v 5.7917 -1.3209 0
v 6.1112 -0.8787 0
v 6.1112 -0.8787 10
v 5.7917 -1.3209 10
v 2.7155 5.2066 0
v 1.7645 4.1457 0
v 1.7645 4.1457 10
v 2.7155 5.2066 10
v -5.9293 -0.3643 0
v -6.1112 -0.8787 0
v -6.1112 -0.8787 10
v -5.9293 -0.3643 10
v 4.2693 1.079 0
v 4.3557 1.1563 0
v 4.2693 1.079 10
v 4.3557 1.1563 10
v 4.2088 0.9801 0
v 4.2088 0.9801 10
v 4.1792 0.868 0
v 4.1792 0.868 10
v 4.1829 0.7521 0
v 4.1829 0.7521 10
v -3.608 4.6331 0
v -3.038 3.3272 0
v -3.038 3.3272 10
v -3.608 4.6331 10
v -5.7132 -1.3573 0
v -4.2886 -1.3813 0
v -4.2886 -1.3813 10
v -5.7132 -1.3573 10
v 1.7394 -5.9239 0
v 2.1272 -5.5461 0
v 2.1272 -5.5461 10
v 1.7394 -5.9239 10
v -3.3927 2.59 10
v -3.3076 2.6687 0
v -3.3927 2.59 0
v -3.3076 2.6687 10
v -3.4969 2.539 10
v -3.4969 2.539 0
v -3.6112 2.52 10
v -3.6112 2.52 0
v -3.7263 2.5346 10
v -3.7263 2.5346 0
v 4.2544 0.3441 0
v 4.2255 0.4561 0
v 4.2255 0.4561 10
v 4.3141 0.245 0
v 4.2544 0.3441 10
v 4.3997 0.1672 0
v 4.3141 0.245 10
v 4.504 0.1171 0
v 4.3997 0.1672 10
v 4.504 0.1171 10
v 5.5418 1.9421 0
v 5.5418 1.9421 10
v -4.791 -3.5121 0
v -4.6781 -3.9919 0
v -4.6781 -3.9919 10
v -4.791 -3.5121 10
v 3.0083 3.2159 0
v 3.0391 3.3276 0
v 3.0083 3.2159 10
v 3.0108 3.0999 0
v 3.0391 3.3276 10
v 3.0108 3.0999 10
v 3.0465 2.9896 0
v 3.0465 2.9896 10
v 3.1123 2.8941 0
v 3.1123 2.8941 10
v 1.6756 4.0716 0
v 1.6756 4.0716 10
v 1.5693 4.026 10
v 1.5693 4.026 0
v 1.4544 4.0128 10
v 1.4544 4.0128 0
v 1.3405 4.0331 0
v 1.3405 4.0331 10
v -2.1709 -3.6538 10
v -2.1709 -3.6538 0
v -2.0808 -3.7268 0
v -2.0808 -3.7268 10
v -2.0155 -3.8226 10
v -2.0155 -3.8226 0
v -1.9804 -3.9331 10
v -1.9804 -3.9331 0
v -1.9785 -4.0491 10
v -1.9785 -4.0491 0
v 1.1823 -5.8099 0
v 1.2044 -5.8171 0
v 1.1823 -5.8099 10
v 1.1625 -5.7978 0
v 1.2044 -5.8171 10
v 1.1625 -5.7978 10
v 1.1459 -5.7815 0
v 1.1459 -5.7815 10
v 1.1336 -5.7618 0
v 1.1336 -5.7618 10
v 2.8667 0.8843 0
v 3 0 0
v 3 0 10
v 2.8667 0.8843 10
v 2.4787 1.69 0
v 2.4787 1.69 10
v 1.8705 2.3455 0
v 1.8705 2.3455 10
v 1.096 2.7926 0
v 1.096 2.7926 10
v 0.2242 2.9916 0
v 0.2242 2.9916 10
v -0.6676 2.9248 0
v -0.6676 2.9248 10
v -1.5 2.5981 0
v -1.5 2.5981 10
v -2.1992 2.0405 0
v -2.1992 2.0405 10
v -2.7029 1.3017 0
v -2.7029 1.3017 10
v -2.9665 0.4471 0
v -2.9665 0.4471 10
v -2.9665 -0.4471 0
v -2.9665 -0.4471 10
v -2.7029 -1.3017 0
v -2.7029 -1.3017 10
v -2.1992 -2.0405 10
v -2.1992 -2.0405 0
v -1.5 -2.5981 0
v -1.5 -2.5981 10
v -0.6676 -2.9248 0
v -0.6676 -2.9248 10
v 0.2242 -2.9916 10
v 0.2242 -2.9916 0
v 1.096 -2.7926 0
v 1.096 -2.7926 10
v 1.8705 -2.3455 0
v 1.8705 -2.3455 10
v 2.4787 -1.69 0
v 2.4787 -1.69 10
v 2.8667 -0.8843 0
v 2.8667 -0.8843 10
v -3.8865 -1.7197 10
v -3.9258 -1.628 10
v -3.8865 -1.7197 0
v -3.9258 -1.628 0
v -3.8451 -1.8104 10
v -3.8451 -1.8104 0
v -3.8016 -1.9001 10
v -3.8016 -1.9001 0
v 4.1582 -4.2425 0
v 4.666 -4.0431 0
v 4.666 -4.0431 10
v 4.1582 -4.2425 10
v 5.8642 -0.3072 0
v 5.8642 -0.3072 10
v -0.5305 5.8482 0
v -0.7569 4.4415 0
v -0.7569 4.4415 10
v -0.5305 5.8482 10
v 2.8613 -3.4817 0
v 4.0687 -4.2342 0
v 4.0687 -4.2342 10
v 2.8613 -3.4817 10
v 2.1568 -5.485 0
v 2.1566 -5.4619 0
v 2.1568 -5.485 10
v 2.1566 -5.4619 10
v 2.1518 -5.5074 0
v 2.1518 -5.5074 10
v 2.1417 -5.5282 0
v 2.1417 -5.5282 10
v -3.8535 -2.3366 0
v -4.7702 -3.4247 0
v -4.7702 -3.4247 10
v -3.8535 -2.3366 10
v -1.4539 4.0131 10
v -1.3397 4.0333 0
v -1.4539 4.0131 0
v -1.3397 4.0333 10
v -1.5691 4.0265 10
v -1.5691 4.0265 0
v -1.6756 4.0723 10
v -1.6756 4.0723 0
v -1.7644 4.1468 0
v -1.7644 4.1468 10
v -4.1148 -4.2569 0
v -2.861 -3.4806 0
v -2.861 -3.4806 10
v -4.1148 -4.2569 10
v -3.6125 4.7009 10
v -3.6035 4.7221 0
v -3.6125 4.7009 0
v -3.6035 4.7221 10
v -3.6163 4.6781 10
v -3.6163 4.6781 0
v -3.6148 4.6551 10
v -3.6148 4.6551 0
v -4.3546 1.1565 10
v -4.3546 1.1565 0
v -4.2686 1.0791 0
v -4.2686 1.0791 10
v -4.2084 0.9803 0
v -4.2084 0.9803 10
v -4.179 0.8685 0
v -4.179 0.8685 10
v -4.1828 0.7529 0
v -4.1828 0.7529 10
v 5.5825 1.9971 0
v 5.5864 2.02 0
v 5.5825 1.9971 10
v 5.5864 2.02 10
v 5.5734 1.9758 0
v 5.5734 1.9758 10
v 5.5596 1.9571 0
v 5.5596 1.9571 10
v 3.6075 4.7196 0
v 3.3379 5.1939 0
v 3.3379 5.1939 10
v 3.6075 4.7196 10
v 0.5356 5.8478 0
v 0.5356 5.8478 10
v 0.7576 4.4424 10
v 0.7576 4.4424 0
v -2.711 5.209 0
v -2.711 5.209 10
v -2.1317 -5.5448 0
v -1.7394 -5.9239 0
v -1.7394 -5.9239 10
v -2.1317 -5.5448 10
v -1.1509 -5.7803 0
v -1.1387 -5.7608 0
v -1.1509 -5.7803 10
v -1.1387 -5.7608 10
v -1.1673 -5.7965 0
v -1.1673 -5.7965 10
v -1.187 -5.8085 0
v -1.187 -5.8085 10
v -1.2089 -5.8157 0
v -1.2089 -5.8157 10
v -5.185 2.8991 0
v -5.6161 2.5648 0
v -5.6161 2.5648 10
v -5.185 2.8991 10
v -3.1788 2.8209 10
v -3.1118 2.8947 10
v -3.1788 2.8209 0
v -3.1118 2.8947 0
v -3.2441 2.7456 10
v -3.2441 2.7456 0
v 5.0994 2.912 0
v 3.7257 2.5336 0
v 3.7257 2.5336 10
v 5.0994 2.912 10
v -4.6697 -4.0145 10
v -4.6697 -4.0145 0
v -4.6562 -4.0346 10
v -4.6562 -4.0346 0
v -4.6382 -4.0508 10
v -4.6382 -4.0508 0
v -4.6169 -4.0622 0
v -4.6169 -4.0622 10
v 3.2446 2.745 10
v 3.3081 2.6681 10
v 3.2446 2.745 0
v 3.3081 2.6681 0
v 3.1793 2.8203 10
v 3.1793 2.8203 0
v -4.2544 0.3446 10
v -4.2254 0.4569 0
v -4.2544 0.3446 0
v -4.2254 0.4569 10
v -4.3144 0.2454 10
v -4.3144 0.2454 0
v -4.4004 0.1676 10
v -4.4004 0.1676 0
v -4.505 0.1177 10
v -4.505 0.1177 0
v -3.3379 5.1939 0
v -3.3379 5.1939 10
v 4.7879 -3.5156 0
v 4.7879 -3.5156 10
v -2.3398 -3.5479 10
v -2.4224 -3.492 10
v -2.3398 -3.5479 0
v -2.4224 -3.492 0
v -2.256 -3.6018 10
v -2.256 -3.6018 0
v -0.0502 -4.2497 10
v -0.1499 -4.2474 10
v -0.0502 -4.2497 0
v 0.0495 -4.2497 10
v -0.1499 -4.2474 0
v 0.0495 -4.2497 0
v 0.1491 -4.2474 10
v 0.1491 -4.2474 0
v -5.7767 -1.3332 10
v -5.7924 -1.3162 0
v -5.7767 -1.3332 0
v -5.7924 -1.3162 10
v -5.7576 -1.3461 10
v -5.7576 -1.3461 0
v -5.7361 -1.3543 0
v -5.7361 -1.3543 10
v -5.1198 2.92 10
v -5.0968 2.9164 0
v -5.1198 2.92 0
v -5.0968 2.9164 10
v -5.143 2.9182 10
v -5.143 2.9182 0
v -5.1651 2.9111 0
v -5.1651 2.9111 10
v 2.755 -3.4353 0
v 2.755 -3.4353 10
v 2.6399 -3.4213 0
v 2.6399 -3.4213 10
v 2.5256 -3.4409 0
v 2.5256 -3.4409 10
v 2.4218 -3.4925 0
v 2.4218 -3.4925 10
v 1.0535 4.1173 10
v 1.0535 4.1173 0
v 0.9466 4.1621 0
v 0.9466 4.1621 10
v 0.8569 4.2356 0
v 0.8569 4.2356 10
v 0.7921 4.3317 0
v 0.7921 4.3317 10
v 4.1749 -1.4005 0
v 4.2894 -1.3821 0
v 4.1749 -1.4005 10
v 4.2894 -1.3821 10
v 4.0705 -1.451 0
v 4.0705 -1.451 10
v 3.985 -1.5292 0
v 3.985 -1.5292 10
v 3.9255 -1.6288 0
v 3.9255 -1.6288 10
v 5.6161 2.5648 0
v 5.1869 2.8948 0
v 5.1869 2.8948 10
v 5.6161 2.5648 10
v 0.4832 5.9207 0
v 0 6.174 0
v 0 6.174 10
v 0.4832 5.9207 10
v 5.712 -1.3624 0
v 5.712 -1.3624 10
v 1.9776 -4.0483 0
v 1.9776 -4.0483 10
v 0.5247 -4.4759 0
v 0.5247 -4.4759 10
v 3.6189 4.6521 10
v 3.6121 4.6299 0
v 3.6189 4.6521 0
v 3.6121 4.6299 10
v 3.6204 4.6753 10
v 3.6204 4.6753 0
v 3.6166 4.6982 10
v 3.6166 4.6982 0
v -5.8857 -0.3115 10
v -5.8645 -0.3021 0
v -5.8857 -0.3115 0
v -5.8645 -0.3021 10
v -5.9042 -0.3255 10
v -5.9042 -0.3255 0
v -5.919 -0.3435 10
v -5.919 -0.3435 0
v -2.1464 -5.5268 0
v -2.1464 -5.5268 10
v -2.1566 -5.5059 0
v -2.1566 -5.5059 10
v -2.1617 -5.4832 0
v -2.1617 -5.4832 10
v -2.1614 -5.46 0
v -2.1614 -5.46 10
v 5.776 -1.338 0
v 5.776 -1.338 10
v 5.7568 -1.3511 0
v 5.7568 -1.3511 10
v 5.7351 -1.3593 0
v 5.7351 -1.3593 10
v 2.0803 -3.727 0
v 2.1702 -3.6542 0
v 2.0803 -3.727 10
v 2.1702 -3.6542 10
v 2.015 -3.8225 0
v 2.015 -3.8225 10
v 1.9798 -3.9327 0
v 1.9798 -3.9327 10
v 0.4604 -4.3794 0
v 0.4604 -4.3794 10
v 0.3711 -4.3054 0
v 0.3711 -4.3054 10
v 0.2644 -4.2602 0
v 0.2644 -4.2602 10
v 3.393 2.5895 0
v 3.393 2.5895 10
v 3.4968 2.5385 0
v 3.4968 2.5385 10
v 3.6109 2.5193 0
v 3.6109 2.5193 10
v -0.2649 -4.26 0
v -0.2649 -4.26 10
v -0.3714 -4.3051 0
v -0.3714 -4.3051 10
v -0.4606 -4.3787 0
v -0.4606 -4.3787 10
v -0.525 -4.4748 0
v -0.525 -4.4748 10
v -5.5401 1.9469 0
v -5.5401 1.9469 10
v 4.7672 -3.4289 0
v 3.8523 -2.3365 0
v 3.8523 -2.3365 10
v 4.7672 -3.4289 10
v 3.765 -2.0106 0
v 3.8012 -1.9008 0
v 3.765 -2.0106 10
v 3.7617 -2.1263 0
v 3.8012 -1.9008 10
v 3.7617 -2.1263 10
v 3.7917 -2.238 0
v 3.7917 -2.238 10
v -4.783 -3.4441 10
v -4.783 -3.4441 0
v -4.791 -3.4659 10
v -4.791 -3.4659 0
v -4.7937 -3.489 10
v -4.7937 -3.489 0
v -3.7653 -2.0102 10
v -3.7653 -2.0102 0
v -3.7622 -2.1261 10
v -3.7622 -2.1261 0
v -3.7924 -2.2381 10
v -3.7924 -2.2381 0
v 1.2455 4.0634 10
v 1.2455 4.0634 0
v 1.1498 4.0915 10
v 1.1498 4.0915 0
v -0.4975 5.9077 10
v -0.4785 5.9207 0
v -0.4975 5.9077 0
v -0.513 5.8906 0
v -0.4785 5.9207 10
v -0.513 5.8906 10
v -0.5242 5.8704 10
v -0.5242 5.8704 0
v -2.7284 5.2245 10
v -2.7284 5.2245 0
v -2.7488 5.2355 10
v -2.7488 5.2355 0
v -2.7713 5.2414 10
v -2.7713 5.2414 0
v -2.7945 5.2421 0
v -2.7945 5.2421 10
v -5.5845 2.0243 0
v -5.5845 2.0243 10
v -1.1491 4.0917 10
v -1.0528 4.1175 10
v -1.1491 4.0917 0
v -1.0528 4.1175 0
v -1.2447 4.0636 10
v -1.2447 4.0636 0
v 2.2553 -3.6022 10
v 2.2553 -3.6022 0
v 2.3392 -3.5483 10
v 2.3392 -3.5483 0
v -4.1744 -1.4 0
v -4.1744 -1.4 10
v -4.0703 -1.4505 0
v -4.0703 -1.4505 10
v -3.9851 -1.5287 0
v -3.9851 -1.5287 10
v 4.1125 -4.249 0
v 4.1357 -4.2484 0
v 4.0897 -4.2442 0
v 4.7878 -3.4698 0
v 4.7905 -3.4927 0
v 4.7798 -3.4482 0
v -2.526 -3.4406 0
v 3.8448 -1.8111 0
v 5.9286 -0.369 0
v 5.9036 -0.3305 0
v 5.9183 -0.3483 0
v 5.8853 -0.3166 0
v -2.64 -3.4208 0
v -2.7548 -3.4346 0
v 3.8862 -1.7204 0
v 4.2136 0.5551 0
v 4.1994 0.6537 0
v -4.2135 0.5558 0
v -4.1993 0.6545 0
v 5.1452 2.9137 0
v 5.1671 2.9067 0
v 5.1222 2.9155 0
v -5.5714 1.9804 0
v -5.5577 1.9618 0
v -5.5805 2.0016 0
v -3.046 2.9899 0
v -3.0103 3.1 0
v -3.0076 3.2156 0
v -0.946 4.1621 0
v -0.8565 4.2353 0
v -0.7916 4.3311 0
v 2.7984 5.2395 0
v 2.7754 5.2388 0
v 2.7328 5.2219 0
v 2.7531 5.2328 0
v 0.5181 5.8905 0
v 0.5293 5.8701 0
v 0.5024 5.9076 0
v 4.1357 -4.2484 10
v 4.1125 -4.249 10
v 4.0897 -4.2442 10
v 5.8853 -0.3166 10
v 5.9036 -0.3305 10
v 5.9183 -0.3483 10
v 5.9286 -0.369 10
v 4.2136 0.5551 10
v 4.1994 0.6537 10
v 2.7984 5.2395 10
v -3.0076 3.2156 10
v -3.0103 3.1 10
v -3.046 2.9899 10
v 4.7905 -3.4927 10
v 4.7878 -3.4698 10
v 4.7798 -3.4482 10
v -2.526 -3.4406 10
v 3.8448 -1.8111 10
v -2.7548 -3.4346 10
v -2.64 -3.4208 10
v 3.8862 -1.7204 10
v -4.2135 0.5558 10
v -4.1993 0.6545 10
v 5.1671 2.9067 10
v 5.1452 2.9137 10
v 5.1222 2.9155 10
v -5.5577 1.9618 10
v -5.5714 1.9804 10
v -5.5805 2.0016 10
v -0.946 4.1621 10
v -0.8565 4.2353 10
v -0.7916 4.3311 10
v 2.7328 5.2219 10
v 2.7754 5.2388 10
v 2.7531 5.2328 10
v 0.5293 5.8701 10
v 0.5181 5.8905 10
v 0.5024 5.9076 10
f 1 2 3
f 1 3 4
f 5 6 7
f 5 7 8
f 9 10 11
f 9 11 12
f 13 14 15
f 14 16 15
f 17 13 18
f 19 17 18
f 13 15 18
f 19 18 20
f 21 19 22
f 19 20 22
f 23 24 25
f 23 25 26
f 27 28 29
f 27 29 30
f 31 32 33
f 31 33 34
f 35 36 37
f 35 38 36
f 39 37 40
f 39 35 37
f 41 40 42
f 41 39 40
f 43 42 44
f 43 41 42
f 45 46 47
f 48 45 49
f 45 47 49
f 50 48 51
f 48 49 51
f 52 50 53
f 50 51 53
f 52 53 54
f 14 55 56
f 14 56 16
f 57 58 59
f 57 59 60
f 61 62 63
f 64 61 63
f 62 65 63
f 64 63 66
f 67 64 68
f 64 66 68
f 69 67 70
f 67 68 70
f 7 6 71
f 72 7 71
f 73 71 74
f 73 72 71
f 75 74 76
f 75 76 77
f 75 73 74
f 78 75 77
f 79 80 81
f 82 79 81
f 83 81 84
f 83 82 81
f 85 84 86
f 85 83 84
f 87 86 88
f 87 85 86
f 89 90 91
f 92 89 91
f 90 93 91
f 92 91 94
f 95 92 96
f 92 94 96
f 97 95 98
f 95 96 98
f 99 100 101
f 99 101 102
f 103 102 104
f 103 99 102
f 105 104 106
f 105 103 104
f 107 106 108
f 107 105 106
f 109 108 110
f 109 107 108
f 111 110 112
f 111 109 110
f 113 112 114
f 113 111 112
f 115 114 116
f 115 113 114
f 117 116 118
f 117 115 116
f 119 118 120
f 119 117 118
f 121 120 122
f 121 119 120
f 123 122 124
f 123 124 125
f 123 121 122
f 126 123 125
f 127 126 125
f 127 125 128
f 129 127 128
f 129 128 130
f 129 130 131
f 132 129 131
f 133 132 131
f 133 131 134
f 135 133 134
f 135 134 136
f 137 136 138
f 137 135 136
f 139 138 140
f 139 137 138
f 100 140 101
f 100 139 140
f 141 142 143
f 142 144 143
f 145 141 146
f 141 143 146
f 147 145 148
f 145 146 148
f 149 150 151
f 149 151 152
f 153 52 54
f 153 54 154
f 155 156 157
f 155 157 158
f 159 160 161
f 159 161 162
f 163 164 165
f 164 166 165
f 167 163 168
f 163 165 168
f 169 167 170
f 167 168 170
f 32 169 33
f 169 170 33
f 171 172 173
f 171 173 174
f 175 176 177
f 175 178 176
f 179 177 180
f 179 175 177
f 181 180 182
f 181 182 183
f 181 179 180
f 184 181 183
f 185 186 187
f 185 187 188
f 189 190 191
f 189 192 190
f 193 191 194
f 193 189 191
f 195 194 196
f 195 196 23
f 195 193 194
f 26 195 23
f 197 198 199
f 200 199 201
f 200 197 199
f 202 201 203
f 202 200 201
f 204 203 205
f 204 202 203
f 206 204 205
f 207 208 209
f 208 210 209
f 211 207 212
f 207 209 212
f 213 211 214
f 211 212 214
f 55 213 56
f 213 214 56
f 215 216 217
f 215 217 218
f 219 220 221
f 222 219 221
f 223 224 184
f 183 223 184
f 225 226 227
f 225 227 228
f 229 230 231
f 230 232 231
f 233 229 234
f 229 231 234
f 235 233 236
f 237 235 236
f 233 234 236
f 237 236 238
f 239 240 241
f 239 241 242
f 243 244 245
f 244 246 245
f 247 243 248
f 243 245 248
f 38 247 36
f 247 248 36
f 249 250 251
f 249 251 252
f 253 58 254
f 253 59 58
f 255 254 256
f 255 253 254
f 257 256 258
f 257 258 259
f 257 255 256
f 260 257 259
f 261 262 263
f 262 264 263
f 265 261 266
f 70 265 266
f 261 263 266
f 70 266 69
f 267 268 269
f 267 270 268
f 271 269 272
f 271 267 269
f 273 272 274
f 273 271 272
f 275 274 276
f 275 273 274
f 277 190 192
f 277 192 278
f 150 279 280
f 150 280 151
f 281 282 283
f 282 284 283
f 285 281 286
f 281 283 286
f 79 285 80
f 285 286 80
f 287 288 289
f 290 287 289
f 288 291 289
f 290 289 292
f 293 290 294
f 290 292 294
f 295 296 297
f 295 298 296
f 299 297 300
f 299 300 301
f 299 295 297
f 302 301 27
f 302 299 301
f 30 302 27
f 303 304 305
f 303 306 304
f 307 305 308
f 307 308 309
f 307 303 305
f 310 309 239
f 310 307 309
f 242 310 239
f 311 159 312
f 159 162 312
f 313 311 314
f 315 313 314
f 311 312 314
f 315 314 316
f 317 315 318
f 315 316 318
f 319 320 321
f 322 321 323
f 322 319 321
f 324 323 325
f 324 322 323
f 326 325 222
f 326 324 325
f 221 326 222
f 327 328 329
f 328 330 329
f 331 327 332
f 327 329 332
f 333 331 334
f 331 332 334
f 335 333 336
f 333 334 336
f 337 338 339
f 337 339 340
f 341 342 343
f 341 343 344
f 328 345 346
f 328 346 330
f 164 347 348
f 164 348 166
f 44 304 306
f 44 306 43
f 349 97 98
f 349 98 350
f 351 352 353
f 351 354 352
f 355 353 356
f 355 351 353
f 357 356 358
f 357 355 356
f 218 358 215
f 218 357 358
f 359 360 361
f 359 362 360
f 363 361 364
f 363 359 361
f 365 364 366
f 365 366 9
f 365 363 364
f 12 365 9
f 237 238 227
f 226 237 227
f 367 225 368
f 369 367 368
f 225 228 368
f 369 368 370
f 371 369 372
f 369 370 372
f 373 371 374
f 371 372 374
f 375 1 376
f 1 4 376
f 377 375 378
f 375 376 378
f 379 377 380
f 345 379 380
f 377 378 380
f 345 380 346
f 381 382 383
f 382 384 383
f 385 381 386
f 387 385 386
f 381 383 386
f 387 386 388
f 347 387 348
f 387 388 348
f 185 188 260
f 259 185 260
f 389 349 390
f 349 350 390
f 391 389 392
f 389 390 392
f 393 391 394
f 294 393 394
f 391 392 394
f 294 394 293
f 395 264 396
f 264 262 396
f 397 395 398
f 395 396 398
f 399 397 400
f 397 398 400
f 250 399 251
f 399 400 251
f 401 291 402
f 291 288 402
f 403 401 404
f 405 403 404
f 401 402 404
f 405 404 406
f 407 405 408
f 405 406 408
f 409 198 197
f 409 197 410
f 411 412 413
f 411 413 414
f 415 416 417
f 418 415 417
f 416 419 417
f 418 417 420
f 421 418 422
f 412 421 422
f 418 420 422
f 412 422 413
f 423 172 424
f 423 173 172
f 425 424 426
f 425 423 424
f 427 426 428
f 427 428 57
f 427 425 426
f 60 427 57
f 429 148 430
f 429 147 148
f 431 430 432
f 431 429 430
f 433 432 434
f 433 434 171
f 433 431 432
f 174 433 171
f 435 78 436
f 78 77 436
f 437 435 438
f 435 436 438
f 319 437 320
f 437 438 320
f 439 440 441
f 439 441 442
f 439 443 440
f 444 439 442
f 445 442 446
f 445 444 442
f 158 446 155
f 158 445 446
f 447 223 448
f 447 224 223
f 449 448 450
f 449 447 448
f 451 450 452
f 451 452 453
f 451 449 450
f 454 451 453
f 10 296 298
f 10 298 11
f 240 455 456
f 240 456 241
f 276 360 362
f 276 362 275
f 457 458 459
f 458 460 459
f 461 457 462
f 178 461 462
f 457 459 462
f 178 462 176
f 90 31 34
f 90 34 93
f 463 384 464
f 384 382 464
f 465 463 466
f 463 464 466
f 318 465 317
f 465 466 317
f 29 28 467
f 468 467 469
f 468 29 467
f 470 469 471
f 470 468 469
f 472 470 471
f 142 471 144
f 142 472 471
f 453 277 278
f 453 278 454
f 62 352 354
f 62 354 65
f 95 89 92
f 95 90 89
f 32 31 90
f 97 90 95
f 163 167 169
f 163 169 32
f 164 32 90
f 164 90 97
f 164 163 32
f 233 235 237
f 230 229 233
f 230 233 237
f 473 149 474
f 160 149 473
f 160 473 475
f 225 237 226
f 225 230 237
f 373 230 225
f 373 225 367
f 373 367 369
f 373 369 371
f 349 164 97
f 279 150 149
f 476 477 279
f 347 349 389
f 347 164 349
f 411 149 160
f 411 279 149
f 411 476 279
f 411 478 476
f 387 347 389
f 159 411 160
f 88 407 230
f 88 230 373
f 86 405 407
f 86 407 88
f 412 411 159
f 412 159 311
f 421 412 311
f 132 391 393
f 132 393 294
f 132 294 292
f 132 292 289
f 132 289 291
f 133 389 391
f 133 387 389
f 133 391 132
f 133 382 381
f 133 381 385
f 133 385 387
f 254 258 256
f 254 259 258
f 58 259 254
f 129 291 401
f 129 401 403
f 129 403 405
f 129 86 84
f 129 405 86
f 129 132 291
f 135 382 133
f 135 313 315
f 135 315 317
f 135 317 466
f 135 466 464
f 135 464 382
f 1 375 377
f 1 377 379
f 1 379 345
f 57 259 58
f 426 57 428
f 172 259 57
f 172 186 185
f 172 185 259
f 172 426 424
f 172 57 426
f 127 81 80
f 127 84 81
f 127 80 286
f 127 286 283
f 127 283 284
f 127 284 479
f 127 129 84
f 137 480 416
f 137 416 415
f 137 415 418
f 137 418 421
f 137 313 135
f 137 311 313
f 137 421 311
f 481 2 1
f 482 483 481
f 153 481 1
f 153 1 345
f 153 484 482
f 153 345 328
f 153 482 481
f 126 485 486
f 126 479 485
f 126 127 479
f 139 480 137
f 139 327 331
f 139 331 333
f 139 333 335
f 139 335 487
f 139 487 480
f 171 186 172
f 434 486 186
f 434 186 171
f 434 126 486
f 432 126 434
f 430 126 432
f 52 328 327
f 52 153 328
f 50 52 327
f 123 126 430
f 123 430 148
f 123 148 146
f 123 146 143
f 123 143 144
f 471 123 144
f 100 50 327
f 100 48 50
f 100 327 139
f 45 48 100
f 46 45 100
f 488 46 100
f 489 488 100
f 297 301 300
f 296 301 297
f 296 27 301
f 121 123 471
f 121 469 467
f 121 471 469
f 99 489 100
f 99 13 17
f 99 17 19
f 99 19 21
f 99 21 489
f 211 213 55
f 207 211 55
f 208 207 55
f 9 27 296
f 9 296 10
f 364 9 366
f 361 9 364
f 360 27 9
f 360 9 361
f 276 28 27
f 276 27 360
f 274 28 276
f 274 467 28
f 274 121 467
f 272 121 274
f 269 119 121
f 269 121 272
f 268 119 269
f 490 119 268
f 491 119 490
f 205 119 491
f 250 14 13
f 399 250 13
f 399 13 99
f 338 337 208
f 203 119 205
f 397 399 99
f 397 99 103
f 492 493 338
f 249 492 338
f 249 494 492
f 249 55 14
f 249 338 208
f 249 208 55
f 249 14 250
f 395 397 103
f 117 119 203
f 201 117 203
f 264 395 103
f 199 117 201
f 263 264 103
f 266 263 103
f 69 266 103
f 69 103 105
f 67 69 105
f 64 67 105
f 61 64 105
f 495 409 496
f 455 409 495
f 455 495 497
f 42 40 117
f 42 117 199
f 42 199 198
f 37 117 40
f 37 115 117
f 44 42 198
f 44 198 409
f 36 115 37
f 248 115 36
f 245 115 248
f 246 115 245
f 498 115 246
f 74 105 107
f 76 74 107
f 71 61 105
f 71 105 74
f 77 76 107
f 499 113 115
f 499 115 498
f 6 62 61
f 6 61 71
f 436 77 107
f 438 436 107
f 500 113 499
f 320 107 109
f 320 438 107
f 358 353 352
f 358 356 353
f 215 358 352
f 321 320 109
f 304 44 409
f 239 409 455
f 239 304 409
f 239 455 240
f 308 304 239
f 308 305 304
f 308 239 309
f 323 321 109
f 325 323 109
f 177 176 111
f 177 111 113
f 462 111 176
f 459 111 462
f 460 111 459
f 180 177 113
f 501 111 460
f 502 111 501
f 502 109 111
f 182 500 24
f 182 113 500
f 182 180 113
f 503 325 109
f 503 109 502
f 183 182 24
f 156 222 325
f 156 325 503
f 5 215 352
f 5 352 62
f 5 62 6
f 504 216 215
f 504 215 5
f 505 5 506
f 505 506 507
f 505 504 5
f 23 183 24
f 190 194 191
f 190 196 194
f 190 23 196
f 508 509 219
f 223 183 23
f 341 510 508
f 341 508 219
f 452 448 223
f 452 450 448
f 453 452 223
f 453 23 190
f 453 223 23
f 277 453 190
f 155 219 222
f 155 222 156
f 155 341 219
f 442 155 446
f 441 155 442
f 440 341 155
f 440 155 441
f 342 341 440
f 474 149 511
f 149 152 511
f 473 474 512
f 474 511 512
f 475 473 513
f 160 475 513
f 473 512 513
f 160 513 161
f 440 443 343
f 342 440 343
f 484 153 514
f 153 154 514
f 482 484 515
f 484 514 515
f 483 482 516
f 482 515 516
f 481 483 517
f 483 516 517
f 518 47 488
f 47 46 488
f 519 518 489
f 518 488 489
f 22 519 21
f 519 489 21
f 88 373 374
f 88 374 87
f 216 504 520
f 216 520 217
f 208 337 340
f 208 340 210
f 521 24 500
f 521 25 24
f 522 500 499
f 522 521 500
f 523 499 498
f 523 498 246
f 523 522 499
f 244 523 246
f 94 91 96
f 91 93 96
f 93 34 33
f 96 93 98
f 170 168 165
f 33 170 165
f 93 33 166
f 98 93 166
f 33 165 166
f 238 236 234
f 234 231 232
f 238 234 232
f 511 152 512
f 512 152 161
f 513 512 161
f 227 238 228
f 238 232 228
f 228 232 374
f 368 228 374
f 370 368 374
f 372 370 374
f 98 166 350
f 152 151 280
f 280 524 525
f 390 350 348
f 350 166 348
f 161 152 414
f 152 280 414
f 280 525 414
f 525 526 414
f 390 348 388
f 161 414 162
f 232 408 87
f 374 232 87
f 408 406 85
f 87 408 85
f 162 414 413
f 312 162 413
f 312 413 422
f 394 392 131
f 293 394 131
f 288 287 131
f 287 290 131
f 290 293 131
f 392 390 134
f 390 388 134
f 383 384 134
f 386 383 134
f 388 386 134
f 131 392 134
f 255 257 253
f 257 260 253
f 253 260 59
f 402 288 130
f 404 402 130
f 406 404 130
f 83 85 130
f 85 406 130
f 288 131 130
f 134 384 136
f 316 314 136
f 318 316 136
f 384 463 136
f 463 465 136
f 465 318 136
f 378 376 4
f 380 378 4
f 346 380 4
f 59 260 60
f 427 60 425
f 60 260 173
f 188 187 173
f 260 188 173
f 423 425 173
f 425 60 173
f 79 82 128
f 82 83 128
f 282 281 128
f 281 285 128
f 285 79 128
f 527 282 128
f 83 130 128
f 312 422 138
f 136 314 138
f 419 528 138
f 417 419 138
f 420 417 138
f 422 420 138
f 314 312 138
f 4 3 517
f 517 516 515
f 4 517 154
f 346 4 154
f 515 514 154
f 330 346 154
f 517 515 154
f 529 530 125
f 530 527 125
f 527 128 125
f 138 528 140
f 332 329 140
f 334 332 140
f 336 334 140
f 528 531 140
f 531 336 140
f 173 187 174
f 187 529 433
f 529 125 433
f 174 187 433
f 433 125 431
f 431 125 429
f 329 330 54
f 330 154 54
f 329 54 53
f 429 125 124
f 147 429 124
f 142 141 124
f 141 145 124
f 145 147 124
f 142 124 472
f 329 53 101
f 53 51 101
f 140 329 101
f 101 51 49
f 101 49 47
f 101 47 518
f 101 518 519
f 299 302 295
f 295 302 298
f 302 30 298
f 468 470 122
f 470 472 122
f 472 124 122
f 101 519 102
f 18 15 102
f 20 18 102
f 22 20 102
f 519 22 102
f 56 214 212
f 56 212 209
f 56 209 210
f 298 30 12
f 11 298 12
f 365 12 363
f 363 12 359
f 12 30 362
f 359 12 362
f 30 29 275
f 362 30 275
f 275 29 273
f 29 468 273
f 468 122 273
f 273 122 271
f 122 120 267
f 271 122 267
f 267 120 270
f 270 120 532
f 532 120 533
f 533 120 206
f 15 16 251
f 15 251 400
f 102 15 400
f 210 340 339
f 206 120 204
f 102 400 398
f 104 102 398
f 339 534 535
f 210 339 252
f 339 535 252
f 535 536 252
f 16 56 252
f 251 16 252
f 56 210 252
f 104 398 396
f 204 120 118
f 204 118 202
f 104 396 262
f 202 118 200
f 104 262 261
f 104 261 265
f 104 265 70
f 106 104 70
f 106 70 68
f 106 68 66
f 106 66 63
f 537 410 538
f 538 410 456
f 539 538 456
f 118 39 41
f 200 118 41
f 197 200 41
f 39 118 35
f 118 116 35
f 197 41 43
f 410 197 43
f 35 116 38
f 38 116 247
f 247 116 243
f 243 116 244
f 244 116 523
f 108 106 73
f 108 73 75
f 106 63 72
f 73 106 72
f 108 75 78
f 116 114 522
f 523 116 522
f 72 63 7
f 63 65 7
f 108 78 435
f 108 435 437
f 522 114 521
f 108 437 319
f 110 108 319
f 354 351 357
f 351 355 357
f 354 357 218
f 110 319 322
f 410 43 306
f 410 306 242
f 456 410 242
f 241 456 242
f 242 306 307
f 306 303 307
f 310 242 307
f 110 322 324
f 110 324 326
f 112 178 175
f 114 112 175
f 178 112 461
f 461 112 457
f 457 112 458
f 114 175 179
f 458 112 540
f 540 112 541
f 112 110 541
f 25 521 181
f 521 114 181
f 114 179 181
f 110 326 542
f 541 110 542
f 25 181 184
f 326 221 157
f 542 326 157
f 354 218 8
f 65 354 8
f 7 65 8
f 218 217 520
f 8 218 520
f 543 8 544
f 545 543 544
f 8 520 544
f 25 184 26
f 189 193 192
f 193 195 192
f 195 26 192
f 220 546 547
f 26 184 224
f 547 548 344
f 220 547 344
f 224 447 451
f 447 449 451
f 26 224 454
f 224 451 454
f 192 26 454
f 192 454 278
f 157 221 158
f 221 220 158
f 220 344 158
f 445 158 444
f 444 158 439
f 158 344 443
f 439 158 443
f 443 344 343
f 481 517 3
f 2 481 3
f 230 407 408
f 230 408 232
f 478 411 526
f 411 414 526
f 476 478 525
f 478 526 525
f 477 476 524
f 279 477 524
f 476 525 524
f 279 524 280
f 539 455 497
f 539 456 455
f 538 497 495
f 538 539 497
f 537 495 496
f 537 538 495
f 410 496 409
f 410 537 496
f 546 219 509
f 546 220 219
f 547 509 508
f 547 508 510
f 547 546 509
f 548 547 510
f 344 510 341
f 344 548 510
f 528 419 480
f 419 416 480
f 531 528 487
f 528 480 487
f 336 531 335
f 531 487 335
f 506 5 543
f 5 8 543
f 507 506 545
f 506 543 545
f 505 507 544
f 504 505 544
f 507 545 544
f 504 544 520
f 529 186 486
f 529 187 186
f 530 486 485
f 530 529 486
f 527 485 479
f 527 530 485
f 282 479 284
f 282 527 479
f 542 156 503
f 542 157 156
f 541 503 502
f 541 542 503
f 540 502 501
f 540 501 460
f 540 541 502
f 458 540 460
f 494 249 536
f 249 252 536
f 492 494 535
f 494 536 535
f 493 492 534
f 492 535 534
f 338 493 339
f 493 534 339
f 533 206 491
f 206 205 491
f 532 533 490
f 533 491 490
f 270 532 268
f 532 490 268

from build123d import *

# Parameters (mm, degrees)
SKETCH1_R           = 4.25
BOSS_EXTRUDE1_DEPTH = 10
BOSS_EXTRUDE2_DEPTH = 10
CIRPATTERN1_COUNT   = 11
SKETCH5_R           = 3
CUT_EXTRUDE1_DEPTH  = 10
FILLET1_R           = 0.4
FILLET2_R           = 0.1


with BuildPart() as part:
    # Sketch1 → Boss-Extrude1 (new body)
    with BuildSketch(Plane.XY):
        Circle(SKETCH1_R)
    extrude(amount=BOSS_EXTRUDE1_DEPTH)

    # Sketch3 → Boss-Extrude2 (add)
    with BuildSketch(Plane.XY):
        Polygon((0, 6.174026833), (0.527734359, 5.897416886), (0.8, 4.174026833), (-0.8, 4.174026833), (-0.522537345, 5.897416886), align=None)
    boss_extrude2 = extrude(amount=BOSS_EXTRUDE2_DEPTH)

    # CirPattern1: Boss-Extrude2 ×11 about axis
    cirpattern1_axis = Axis((0, 0, 0), (0, 0, 1))
    for i in range(1, CIRPATTERN1_COUNT):
        add(boss_extrude2.rotate(cirpattern1_axis, i * 360 / CIRPATTERN1_COUNT))

    # Sketch5 → Cut-Extrude1 (cut)
    with BuildSketch(Plane.XY):
        Circle(SKETCH5_R)
    extrude(amount=CUT_EXTRUDE1_DEPTH, mode=Mode.SUBTRACT)

    # Fillet1
    fillet1_edges = [part.edges().sort_by_distance(p)[0] for p in [
        (1.943553631, -3.779563372, 5),
        (0.408364873, -4.230335463, 5),
        (3.678407589, -2.128806616, 5),
        (2.630630415, -3.338005935, 5),
        (4.245393129, 0.1978312, 5),
        (4.017689387, -1.385883107, 5),
        (3.464496346, 2.461659007, 5),
        (4.129160367, 1.006247815, 5),
        (1.583646453, 3.943927473, 5),
        (2.929652105, 3.078902165, 5),
        (-2.929652105, 3.078902165, 5),
        (-1.583646453, 3.943927473, 5),
        (-4.129160367, 1.006247815, 5),
        (-3.464496346, 2.461659007, 5),
        (-4.017689387, -1.385883107, 5),
        (-4.245393129, 0.1978312, 5),
        (-2.630630415, -3.338005935, 5),
        (-3.678407589, -2.128806616, 5),
        (-0.408364873, -4.230335463, 5),
        (-1.943553631, -3.779563372, 5),
        (-0.8, 4.174026833, 5),
        (0.8, 4.174026833, 5),
    ]]
    fillet(fillet1_edges, radius=FILLET1_R)

    # Fillet2
    fillet2_edges = [part.edges().sort_by_distance(p)[0] for p in [
        (0.527734359, 5.897416886, 5),
        (2.162865249, -5.511314283, 5),
        (1.155136929, -5.807210015, 5),
        (4.799159491, -3.467079374, 5),
        (4.111377792, -4.260821767, 5),
        (5.911754503, -0.322071262, 5),
        (5.762285256, -1.361652714, 5),
        (5.147409232, 2.9251922, 5),
        (5.583707865, 1.969831455, 5),
        (2.748797899, 5.243727807, 5),
        (3.63234268, 4.675908055, 5),
        (-3.627970674, 4.678717773, 5),
        (-2.744425893, 5.246537525, 5),
        (-5.581548948, 1.974558825, 5),
        (-5.145250314, 2.92991957, 5),
        (-5.763024868, -1.356508599, 5),
        (-5.912494116, -0.316927147, 5),
        (-4.666018151, -4.043127743, 5),
        (-4.802562811, -3.463151734, 5),
        (-1.160123427, -5.805745847, 5),
        (-2.167851747, -5.509850115, 5),
        (-0.522537345, 5.897416886, 5),
    ]]
    fillet(fillet2_edges, radius=FILLET2_R)


solid = part.part
